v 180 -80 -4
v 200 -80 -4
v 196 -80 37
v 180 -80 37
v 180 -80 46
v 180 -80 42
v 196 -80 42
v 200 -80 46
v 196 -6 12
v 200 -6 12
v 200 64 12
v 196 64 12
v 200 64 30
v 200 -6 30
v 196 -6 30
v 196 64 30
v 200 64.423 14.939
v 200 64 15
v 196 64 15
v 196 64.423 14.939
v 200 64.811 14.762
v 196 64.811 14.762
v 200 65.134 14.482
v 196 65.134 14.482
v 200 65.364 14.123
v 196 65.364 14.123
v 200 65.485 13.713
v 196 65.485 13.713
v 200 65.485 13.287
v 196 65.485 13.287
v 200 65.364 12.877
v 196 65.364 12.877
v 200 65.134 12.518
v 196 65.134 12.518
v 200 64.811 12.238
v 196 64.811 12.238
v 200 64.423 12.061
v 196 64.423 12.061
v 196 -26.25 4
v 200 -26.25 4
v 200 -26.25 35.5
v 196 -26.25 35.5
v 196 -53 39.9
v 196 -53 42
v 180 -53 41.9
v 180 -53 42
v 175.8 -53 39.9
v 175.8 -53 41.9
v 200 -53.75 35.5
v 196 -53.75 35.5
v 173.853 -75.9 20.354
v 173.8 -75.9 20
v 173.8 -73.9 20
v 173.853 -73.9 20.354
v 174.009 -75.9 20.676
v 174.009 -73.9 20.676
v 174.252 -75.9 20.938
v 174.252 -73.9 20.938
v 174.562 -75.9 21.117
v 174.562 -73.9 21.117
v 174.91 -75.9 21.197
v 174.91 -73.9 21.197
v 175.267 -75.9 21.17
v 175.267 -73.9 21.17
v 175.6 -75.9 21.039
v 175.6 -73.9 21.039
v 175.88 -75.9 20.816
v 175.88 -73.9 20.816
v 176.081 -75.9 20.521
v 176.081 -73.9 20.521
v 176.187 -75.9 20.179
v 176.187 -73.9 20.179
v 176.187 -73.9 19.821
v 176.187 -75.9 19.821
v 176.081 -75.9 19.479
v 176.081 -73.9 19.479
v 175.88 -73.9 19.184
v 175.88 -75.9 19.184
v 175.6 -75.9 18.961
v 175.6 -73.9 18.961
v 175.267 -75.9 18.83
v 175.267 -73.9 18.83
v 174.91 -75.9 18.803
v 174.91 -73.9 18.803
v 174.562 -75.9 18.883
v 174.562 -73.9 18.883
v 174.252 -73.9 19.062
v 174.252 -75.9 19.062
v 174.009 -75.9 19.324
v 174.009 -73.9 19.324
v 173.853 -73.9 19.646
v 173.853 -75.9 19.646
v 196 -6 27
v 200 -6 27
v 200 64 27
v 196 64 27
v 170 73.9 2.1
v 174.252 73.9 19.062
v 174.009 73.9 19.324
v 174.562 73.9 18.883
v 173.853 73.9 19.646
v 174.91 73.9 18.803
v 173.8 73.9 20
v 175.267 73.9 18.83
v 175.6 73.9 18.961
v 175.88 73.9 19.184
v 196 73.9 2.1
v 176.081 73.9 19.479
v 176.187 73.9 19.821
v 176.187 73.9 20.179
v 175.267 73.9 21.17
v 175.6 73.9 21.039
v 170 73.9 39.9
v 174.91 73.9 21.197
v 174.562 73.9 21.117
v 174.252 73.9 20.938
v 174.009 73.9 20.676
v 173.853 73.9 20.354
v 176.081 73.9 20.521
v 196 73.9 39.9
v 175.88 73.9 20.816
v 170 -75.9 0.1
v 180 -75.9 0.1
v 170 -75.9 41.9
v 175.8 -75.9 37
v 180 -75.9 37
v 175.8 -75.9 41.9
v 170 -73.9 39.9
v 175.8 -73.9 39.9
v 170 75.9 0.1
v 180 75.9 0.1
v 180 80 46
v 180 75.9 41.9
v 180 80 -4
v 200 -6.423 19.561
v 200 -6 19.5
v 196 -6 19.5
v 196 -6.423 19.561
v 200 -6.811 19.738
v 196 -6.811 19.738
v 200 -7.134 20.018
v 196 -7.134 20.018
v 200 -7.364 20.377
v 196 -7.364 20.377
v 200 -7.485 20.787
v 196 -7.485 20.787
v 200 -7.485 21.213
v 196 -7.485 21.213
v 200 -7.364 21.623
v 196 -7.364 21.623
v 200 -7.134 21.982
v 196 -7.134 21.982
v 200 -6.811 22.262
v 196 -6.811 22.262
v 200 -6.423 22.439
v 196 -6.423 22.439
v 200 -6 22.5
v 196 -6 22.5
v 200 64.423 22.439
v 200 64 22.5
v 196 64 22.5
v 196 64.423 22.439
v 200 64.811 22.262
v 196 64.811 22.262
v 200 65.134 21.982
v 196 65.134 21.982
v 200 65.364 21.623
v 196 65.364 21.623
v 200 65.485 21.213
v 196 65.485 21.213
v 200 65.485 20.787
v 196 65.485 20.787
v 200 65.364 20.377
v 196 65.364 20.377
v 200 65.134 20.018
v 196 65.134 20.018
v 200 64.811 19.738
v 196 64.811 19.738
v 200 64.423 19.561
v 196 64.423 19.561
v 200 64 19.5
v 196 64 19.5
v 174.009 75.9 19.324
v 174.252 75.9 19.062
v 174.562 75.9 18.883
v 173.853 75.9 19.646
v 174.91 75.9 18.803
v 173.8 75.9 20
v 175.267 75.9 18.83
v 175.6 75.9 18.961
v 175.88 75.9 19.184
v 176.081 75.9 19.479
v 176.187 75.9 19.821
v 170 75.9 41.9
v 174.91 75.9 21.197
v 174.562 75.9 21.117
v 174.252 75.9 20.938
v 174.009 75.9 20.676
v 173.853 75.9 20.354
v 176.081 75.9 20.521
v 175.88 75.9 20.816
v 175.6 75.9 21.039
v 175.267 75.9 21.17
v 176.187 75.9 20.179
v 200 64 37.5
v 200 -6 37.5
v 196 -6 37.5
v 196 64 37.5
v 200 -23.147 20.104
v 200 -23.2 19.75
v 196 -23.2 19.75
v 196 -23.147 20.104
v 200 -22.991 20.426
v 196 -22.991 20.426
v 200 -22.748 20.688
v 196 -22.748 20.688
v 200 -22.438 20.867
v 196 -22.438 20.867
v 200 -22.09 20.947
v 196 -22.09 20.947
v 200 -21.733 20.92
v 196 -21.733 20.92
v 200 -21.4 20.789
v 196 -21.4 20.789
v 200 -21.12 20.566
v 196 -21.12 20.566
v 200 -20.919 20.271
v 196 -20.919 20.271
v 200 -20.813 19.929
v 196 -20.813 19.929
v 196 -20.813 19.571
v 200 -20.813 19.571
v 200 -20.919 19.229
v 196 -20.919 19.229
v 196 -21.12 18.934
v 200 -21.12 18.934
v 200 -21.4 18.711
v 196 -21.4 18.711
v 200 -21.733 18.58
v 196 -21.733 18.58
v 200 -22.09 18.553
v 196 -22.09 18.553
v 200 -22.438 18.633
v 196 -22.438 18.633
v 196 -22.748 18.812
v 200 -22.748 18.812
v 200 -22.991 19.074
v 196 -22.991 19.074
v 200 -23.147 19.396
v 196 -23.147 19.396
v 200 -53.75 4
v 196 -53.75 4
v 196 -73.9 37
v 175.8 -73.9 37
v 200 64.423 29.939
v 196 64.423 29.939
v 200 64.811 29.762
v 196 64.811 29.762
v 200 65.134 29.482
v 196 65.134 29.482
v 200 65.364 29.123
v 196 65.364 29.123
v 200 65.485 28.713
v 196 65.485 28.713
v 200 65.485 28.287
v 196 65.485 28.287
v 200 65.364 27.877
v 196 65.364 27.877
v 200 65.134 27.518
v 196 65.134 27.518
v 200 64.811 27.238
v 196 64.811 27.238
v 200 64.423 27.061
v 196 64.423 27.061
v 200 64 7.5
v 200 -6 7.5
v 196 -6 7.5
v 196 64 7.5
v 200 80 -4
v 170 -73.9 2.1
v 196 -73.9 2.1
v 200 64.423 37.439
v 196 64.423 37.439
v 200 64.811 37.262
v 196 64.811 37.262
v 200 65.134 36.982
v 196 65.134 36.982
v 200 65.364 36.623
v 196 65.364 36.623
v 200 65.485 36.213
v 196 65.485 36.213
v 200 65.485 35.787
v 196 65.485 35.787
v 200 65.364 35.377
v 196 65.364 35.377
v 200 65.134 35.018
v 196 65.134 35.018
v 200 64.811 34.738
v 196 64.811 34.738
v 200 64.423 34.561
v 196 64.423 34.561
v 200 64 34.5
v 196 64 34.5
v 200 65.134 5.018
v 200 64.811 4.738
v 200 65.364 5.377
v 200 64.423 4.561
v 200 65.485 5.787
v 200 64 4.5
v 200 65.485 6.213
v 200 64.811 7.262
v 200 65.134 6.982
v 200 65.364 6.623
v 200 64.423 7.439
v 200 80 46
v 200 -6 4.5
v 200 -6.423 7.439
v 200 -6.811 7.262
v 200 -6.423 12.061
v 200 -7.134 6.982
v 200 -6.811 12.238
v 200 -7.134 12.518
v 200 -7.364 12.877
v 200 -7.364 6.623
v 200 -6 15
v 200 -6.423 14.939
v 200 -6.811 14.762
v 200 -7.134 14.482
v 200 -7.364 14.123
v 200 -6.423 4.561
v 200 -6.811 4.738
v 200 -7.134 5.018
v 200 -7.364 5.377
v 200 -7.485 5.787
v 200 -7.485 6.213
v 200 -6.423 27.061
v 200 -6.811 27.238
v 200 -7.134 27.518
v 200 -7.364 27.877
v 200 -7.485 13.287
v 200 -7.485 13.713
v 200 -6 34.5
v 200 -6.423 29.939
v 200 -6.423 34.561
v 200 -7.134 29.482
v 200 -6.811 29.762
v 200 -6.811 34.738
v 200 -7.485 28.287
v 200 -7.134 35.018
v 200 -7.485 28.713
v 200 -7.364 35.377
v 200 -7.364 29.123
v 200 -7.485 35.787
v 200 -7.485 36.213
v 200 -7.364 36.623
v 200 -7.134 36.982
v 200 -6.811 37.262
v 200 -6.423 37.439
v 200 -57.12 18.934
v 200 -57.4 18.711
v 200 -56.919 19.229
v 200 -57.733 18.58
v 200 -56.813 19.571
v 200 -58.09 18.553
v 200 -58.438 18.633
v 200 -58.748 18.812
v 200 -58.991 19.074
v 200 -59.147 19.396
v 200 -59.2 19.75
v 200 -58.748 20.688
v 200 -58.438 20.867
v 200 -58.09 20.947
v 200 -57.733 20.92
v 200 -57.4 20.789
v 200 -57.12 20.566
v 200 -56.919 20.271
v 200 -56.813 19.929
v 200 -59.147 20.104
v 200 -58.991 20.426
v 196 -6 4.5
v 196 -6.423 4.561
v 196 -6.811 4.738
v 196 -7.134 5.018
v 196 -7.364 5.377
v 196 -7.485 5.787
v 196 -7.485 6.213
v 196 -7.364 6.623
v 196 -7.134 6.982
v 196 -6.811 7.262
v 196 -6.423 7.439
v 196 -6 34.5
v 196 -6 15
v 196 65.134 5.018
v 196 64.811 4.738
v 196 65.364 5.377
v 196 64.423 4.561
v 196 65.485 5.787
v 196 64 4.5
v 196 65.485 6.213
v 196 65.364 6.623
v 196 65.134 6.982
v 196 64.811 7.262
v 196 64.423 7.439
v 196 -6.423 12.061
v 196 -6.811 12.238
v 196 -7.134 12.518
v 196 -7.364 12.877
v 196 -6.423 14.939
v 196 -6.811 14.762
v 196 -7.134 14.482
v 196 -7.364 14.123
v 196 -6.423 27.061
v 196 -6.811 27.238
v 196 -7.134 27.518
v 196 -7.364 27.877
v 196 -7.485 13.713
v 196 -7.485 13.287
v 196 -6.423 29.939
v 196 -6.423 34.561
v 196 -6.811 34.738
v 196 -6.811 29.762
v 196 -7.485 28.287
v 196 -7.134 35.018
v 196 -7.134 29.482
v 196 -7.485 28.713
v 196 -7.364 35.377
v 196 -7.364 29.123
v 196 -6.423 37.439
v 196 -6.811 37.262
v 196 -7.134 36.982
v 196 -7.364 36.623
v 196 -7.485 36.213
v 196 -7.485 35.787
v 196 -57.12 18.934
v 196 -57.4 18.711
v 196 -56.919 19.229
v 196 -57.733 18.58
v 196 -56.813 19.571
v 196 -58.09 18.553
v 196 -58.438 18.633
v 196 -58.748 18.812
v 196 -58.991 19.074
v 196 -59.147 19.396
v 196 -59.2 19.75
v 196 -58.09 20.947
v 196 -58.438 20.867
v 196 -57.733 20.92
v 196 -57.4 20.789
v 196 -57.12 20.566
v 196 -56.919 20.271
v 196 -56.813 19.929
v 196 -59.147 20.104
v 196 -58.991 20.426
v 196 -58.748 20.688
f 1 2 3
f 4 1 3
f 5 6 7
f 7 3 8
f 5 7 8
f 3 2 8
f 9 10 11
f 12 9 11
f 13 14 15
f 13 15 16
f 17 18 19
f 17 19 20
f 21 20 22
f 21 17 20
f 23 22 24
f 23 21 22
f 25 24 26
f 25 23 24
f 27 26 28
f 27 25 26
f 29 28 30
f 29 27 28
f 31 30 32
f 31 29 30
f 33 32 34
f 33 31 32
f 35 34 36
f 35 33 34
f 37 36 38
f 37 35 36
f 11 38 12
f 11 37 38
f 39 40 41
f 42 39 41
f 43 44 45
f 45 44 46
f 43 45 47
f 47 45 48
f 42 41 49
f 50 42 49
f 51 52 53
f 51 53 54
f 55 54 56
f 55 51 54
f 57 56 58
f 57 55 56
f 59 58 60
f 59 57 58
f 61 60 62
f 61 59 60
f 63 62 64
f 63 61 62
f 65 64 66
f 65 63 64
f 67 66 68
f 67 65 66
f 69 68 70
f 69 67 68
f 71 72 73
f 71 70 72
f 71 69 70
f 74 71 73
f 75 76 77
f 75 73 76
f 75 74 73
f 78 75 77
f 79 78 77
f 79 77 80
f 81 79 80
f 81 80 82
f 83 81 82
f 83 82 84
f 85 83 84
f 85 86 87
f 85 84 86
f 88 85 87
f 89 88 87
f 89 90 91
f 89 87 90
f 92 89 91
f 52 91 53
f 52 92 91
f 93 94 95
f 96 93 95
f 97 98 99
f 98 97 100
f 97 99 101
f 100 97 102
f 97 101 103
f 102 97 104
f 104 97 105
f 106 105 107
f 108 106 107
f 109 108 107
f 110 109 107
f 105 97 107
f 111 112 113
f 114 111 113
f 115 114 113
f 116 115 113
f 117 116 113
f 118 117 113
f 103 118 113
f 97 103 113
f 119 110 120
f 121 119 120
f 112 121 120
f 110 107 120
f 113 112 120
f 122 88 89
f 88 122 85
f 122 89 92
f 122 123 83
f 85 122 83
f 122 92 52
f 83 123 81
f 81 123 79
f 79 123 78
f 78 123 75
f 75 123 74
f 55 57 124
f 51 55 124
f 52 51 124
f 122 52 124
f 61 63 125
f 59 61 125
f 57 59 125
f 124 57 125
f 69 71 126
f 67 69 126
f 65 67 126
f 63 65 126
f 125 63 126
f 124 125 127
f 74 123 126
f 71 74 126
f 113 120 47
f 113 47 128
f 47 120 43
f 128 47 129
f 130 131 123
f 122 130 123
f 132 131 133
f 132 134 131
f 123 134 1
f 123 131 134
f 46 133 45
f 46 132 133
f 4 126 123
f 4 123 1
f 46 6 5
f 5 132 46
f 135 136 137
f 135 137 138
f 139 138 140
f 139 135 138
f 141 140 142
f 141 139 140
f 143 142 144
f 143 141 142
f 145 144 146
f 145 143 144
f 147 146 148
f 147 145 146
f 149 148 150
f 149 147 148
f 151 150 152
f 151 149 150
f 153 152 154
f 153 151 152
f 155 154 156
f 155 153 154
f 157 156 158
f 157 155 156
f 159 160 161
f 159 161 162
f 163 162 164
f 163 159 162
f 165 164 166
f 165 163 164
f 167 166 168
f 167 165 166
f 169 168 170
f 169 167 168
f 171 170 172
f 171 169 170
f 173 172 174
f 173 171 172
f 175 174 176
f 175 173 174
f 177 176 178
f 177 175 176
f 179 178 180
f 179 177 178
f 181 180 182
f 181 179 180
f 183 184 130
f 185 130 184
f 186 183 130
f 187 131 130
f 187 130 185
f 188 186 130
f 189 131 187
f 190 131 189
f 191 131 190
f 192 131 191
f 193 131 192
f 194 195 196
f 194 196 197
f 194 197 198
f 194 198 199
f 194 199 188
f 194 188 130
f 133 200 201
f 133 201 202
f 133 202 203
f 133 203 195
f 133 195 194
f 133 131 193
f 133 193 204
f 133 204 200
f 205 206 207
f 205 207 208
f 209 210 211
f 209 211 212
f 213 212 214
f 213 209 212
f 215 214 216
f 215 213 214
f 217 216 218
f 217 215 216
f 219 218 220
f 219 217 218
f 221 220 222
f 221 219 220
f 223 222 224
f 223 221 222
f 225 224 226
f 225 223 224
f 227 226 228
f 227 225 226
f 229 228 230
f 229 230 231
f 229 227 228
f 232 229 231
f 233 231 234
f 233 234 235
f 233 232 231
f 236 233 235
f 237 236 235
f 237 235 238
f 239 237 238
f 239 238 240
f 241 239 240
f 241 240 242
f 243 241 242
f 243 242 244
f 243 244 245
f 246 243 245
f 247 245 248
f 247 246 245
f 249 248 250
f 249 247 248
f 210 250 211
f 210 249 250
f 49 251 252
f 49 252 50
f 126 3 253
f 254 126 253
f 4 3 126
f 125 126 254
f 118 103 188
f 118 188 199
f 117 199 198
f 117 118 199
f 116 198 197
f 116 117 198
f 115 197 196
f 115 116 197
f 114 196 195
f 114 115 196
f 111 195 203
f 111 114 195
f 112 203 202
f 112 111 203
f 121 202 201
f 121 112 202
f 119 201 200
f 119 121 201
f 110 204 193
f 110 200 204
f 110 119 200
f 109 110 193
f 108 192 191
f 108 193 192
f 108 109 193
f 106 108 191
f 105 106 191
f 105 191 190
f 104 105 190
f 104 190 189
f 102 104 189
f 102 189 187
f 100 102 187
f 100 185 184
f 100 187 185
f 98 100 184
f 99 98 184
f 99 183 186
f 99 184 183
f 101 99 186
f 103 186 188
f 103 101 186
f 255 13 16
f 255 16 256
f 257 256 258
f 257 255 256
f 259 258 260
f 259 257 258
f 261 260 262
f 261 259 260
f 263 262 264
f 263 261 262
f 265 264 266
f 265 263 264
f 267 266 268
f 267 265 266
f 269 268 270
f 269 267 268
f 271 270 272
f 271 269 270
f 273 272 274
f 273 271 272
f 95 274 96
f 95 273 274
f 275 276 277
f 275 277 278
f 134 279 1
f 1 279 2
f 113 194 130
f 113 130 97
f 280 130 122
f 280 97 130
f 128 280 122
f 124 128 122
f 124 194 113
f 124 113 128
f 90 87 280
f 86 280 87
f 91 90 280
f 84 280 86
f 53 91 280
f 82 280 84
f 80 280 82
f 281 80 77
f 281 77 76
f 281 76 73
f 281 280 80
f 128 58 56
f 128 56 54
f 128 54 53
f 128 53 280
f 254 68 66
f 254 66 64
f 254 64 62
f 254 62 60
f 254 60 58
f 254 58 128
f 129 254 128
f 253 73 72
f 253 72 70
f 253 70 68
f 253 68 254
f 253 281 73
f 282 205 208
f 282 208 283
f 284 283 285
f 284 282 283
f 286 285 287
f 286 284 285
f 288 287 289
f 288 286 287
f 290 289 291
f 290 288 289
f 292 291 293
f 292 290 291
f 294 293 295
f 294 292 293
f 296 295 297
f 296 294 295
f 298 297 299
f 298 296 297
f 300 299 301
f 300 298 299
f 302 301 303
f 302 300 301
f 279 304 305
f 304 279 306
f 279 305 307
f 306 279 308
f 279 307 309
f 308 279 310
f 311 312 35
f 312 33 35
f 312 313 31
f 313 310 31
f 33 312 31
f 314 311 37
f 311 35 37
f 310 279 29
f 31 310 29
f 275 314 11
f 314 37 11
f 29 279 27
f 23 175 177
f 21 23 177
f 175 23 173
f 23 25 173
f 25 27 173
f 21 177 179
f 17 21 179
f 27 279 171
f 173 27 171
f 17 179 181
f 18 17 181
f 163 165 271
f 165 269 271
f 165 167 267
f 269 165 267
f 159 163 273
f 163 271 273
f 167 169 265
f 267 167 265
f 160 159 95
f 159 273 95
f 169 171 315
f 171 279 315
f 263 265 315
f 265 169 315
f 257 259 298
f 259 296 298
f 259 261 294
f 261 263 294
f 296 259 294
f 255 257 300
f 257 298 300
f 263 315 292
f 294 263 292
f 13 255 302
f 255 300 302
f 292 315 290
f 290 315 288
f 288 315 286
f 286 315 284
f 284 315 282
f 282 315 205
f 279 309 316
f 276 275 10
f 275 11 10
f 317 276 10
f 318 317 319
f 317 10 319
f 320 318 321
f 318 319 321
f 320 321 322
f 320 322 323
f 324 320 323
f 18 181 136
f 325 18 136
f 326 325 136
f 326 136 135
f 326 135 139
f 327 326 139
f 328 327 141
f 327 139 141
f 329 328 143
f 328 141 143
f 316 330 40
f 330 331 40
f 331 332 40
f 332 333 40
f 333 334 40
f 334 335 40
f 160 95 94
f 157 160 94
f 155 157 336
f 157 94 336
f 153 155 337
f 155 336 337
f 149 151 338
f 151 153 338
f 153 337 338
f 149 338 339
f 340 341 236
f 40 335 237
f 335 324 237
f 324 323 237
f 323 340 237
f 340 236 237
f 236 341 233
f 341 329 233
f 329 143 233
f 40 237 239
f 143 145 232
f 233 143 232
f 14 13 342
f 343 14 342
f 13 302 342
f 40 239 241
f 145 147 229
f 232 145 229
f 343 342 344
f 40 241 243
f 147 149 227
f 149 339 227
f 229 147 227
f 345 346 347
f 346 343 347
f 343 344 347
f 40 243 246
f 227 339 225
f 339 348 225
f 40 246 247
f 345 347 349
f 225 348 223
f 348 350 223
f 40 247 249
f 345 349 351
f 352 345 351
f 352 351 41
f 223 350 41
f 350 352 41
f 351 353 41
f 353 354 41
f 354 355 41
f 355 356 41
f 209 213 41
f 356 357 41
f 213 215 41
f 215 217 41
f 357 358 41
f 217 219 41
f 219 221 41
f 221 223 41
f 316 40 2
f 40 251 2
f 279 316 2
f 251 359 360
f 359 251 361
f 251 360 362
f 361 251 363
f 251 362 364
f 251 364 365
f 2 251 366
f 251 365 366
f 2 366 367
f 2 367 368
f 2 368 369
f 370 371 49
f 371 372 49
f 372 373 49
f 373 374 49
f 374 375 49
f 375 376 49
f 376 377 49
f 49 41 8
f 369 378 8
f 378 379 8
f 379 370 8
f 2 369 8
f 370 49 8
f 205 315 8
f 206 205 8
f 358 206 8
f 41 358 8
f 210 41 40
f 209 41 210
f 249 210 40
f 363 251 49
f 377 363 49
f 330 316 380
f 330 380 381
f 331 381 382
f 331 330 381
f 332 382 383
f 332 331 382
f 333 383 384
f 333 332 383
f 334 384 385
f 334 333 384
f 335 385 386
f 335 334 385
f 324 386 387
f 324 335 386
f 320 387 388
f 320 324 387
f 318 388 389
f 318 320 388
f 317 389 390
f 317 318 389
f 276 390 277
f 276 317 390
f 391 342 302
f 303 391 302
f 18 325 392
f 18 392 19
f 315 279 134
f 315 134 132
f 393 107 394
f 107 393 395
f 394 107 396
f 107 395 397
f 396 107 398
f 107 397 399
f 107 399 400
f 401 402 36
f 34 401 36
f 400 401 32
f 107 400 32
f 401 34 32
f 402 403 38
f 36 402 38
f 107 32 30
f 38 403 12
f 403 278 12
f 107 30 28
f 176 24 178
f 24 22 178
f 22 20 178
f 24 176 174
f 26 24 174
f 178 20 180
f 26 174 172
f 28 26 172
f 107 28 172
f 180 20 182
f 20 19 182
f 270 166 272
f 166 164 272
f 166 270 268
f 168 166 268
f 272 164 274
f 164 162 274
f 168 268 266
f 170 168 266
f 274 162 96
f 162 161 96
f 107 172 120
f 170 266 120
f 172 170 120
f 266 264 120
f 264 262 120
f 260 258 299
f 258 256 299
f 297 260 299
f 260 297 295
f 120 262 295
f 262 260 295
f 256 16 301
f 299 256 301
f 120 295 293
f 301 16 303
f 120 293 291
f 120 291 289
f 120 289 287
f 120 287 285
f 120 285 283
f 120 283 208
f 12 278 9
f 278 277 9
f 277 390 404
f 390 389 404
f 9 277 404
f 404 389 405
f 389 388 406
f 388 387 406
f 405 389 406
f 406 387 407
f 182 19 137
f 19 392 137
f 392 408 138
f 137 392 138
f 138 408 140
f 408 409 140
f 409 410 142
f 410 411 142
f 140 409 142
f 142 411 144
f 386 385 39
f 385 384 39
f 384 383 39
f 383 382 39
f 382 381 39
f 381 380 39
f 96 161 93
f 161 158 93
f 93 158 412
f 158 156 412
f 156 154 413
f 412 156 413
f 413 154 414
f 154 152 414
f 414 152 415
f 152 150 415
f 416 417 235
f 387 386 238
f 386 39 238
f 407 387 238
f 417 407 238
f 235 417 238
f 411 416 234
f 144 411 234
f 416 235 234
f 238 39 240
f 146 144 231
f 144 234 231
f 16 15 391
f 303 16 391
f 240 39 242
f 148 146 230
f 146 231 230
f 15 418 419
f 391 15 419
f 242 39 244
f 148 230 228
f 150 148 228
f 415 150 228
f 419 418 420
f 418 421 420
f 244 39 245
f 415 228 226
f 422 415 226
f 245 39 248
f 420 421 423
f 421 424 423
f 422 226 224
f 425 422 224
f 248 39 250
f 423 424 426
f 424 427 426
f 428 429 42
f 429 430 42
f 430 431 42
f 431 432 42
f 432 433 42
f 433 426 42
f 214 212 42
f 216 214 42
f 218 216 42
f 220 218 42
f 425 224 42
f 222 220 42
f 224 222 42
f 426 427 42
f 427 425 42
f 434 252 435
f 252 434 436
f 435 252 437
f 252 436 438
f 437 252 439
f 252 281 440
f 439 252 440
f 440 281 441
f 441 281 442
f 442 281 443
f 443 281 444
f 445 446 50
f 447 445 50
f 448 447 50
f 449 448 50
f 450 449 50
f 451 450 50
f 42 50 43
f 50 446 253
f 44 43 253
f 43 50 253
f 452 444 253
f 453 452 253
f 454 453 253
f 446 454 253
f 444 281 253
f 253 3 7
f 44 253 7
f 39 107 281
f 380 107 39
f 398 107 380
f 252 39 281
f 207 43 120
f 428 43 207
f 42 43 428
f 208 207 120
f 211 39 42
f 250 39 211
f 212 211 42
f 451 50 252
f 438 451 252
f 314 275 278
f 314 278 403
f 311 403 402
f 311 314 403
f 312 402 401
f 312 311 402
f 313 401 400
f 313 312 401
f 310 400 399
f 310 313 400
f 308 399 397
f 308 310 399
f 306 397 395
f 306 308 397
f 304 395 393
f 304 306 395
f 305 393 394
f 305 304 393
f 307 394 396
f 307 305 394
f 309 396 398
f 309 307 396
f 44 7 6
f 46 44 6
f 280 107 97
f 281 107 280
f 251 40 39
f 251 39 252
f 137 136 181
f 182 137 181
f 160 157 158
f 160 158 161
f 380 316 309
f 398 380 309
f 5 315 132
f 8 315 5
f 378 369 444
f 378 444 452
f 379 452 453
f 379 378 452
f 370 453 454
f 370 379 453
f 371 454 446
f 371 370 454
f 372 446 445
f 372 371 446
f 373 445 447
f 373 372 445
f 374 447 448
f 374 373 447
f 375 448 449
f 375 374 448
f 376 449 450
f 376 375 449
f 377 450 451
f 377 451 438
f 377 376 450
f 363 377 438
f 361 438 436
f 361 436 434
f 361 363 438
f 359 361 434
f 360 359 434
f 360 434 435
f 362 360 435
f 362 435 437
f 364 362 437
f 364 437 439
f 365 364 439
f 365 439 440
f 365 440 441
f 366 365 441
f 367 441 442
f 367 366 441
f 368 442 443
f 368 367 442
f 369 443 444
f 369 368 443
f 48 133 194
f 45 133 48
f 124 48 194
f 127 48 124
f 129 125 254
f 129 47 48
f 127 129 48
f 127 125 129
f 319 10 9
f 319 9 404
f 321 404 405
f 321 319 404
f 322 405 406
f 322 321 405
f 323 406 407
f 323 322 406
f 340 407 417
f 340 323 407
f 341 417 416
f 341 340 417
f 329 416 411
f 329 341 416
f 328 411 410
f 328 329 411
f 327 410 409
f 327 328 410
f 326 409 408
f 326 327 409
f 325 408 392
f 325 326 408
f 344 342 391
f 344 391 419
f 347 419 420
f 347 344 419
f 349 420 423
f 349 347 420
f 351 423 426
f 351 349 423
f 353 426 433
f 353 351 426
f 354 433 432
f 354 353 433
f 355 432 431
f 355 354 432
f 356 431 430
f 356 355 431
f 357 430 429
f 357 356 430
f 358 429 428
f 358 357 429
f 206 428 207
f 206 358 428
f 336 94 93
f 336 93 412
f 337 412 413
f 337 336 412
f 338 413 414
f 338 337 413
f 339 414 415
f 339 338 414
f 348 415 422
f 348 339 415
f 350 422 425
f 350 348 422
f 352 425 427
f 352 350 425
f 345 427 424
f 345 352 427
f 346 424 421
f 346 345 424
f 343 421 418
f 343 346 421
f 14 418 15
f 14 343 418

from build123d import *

# Parameters (mm, degrees)
SKETCH011_W             = 160
SKETCH011_H             = 50
SKETCH011_R             = 1.2
SKETCH011_W_2           = 27.5
SKETCH011_H_2           = 31.5
PAD004_DEPTH            = 4
SKETCH012_W             = 151.8
SKETCH012_H             = 41.8
SKETCH012_W_2           = 147.8
SKETCH012_H_2           = 37.8
PAD005_DEPTH            = 30
SKETCH013_W             = 160
SKETCH013_H             = 50
SKETCH013_W_2           = 151.8
SKETCH013_H_2           = 41.8
PAD006_DEPTH            = 20
SKETCH014_W             = 20.2
SKETCH014_H             = 5
POCKET004_DEPTH         = 27
SKETCH027_R             = 1.2
POCKET014_DEPTH         = 160.001
POCKET015_DEPTH         = 30.001
LINEARPATTERN007_COUNT  = 5
LINEARPATTERN007_PITCH  = 7.5
BODY002_PLACEMENT_ANGLE = 180


with BuildPart() as part:
    # Sketch011 → Pad004 (new body)
    with BuildSketch(Plane.YZ):
        with Locations((0, 25)):
            Rectangle(SKETCH011_W, SKETCH011_H)
        with Locations((22, 23.75)):
            Circle(SKETCH011_R, mode=Mode.SUBTRACT)
        with Locations((58, 23.75)):
            Circle(SKETCH011_R, mode=Mode.SUBTRACT)
        with Locations((40, 23.75)):
            Rectangle(SKETCH011_W_2, SKETCH011_H_2, mode=Mode.SUBTRACT)
    extrude(amount=PAD004_DEPTH)

    # Sketch012 → Pad005 (join)
    with BuildSketch(Plane.YZ):
        with Locations((0, 25)):
            Rectangle(SKETCH012_W, SKETCH012_H)
        with Locations((0, 25)):
            Rectangle(SKETCH012_W_2, SKETCH012_H_2, mode=Mode.SUBTRACT)
    extrude(amount=PAD005_DEPTH)

    # Sketch013 → Pad006 (join)
    with BuildSketch(Plane.YZ):
        with Locations((0, 25)):
            Rectangle(SKETCH013_W, SKETCH013_H)
        with Locations((0, 25)):
            Rectangle(SKETCH013_W_2, SKETCH013_H_2, mode=Mode.SUBTRACT)
    extrude(amount=PAD006_DEPTH)

    # Sketch014 (on DatumPlane) → Pocket004 (cut)
    with BuildSketch(Plane.XZ.offset(-80)):
        with Locations((14.1, 43.5)):
            Rectangle(SKETCH014_W, SKETCH014_H)
    extrude(amount=POCKET004_DEPTH, mode=Mode.SUBTRACT)

    # Sketch027 (on DatumPlane) → Pocket014 (cut, through all)
    with BuildSketch(Plane.XZ.offset(-80)):
        with Locations((25, 24)):
            Circle(SKETCH027_R)
    extrude(amount=POCKET014_DEPTH, mode=Mode.SUBTRACT)

    # Sketch028 → Pocket015 (cut, through all)
    with BuildSketch(Plane.YZ):
        with BuildLine():
            Line((6, 11.5), (-64, 11.5))
            ThreePointArc((-64, 11.5), (-65.5, 10), (-64, 8.5))
            Line((6, 8.5), (-64, 8.5))
            ThreePointArc((6, 8.5), (7.5, 10), (6, 11.5))
        make_face()
    pocket015 = extrude(amount=POCKET015_DEPTH, mode=Mode.SUBTRACT)

    # LinearPattern007: Pocket015 ×5
    with Locations(*[(0, 0, i * LINEARPATTERN007_PITCH) for i in range(1, LINEARPATTERN007_COUNT)]):
        add(pocket015, mode=Mode.SUBTRACT)


with BuildPart() as part_1:
    # Body002 placement: moved
    add(part.part.moved(Location((200, 0, -4))).rotate(Axis((200, 0, -4), (0, 0, 1)), BODY002_PLACEMENT_ANGLE))


solid = part_1.part
